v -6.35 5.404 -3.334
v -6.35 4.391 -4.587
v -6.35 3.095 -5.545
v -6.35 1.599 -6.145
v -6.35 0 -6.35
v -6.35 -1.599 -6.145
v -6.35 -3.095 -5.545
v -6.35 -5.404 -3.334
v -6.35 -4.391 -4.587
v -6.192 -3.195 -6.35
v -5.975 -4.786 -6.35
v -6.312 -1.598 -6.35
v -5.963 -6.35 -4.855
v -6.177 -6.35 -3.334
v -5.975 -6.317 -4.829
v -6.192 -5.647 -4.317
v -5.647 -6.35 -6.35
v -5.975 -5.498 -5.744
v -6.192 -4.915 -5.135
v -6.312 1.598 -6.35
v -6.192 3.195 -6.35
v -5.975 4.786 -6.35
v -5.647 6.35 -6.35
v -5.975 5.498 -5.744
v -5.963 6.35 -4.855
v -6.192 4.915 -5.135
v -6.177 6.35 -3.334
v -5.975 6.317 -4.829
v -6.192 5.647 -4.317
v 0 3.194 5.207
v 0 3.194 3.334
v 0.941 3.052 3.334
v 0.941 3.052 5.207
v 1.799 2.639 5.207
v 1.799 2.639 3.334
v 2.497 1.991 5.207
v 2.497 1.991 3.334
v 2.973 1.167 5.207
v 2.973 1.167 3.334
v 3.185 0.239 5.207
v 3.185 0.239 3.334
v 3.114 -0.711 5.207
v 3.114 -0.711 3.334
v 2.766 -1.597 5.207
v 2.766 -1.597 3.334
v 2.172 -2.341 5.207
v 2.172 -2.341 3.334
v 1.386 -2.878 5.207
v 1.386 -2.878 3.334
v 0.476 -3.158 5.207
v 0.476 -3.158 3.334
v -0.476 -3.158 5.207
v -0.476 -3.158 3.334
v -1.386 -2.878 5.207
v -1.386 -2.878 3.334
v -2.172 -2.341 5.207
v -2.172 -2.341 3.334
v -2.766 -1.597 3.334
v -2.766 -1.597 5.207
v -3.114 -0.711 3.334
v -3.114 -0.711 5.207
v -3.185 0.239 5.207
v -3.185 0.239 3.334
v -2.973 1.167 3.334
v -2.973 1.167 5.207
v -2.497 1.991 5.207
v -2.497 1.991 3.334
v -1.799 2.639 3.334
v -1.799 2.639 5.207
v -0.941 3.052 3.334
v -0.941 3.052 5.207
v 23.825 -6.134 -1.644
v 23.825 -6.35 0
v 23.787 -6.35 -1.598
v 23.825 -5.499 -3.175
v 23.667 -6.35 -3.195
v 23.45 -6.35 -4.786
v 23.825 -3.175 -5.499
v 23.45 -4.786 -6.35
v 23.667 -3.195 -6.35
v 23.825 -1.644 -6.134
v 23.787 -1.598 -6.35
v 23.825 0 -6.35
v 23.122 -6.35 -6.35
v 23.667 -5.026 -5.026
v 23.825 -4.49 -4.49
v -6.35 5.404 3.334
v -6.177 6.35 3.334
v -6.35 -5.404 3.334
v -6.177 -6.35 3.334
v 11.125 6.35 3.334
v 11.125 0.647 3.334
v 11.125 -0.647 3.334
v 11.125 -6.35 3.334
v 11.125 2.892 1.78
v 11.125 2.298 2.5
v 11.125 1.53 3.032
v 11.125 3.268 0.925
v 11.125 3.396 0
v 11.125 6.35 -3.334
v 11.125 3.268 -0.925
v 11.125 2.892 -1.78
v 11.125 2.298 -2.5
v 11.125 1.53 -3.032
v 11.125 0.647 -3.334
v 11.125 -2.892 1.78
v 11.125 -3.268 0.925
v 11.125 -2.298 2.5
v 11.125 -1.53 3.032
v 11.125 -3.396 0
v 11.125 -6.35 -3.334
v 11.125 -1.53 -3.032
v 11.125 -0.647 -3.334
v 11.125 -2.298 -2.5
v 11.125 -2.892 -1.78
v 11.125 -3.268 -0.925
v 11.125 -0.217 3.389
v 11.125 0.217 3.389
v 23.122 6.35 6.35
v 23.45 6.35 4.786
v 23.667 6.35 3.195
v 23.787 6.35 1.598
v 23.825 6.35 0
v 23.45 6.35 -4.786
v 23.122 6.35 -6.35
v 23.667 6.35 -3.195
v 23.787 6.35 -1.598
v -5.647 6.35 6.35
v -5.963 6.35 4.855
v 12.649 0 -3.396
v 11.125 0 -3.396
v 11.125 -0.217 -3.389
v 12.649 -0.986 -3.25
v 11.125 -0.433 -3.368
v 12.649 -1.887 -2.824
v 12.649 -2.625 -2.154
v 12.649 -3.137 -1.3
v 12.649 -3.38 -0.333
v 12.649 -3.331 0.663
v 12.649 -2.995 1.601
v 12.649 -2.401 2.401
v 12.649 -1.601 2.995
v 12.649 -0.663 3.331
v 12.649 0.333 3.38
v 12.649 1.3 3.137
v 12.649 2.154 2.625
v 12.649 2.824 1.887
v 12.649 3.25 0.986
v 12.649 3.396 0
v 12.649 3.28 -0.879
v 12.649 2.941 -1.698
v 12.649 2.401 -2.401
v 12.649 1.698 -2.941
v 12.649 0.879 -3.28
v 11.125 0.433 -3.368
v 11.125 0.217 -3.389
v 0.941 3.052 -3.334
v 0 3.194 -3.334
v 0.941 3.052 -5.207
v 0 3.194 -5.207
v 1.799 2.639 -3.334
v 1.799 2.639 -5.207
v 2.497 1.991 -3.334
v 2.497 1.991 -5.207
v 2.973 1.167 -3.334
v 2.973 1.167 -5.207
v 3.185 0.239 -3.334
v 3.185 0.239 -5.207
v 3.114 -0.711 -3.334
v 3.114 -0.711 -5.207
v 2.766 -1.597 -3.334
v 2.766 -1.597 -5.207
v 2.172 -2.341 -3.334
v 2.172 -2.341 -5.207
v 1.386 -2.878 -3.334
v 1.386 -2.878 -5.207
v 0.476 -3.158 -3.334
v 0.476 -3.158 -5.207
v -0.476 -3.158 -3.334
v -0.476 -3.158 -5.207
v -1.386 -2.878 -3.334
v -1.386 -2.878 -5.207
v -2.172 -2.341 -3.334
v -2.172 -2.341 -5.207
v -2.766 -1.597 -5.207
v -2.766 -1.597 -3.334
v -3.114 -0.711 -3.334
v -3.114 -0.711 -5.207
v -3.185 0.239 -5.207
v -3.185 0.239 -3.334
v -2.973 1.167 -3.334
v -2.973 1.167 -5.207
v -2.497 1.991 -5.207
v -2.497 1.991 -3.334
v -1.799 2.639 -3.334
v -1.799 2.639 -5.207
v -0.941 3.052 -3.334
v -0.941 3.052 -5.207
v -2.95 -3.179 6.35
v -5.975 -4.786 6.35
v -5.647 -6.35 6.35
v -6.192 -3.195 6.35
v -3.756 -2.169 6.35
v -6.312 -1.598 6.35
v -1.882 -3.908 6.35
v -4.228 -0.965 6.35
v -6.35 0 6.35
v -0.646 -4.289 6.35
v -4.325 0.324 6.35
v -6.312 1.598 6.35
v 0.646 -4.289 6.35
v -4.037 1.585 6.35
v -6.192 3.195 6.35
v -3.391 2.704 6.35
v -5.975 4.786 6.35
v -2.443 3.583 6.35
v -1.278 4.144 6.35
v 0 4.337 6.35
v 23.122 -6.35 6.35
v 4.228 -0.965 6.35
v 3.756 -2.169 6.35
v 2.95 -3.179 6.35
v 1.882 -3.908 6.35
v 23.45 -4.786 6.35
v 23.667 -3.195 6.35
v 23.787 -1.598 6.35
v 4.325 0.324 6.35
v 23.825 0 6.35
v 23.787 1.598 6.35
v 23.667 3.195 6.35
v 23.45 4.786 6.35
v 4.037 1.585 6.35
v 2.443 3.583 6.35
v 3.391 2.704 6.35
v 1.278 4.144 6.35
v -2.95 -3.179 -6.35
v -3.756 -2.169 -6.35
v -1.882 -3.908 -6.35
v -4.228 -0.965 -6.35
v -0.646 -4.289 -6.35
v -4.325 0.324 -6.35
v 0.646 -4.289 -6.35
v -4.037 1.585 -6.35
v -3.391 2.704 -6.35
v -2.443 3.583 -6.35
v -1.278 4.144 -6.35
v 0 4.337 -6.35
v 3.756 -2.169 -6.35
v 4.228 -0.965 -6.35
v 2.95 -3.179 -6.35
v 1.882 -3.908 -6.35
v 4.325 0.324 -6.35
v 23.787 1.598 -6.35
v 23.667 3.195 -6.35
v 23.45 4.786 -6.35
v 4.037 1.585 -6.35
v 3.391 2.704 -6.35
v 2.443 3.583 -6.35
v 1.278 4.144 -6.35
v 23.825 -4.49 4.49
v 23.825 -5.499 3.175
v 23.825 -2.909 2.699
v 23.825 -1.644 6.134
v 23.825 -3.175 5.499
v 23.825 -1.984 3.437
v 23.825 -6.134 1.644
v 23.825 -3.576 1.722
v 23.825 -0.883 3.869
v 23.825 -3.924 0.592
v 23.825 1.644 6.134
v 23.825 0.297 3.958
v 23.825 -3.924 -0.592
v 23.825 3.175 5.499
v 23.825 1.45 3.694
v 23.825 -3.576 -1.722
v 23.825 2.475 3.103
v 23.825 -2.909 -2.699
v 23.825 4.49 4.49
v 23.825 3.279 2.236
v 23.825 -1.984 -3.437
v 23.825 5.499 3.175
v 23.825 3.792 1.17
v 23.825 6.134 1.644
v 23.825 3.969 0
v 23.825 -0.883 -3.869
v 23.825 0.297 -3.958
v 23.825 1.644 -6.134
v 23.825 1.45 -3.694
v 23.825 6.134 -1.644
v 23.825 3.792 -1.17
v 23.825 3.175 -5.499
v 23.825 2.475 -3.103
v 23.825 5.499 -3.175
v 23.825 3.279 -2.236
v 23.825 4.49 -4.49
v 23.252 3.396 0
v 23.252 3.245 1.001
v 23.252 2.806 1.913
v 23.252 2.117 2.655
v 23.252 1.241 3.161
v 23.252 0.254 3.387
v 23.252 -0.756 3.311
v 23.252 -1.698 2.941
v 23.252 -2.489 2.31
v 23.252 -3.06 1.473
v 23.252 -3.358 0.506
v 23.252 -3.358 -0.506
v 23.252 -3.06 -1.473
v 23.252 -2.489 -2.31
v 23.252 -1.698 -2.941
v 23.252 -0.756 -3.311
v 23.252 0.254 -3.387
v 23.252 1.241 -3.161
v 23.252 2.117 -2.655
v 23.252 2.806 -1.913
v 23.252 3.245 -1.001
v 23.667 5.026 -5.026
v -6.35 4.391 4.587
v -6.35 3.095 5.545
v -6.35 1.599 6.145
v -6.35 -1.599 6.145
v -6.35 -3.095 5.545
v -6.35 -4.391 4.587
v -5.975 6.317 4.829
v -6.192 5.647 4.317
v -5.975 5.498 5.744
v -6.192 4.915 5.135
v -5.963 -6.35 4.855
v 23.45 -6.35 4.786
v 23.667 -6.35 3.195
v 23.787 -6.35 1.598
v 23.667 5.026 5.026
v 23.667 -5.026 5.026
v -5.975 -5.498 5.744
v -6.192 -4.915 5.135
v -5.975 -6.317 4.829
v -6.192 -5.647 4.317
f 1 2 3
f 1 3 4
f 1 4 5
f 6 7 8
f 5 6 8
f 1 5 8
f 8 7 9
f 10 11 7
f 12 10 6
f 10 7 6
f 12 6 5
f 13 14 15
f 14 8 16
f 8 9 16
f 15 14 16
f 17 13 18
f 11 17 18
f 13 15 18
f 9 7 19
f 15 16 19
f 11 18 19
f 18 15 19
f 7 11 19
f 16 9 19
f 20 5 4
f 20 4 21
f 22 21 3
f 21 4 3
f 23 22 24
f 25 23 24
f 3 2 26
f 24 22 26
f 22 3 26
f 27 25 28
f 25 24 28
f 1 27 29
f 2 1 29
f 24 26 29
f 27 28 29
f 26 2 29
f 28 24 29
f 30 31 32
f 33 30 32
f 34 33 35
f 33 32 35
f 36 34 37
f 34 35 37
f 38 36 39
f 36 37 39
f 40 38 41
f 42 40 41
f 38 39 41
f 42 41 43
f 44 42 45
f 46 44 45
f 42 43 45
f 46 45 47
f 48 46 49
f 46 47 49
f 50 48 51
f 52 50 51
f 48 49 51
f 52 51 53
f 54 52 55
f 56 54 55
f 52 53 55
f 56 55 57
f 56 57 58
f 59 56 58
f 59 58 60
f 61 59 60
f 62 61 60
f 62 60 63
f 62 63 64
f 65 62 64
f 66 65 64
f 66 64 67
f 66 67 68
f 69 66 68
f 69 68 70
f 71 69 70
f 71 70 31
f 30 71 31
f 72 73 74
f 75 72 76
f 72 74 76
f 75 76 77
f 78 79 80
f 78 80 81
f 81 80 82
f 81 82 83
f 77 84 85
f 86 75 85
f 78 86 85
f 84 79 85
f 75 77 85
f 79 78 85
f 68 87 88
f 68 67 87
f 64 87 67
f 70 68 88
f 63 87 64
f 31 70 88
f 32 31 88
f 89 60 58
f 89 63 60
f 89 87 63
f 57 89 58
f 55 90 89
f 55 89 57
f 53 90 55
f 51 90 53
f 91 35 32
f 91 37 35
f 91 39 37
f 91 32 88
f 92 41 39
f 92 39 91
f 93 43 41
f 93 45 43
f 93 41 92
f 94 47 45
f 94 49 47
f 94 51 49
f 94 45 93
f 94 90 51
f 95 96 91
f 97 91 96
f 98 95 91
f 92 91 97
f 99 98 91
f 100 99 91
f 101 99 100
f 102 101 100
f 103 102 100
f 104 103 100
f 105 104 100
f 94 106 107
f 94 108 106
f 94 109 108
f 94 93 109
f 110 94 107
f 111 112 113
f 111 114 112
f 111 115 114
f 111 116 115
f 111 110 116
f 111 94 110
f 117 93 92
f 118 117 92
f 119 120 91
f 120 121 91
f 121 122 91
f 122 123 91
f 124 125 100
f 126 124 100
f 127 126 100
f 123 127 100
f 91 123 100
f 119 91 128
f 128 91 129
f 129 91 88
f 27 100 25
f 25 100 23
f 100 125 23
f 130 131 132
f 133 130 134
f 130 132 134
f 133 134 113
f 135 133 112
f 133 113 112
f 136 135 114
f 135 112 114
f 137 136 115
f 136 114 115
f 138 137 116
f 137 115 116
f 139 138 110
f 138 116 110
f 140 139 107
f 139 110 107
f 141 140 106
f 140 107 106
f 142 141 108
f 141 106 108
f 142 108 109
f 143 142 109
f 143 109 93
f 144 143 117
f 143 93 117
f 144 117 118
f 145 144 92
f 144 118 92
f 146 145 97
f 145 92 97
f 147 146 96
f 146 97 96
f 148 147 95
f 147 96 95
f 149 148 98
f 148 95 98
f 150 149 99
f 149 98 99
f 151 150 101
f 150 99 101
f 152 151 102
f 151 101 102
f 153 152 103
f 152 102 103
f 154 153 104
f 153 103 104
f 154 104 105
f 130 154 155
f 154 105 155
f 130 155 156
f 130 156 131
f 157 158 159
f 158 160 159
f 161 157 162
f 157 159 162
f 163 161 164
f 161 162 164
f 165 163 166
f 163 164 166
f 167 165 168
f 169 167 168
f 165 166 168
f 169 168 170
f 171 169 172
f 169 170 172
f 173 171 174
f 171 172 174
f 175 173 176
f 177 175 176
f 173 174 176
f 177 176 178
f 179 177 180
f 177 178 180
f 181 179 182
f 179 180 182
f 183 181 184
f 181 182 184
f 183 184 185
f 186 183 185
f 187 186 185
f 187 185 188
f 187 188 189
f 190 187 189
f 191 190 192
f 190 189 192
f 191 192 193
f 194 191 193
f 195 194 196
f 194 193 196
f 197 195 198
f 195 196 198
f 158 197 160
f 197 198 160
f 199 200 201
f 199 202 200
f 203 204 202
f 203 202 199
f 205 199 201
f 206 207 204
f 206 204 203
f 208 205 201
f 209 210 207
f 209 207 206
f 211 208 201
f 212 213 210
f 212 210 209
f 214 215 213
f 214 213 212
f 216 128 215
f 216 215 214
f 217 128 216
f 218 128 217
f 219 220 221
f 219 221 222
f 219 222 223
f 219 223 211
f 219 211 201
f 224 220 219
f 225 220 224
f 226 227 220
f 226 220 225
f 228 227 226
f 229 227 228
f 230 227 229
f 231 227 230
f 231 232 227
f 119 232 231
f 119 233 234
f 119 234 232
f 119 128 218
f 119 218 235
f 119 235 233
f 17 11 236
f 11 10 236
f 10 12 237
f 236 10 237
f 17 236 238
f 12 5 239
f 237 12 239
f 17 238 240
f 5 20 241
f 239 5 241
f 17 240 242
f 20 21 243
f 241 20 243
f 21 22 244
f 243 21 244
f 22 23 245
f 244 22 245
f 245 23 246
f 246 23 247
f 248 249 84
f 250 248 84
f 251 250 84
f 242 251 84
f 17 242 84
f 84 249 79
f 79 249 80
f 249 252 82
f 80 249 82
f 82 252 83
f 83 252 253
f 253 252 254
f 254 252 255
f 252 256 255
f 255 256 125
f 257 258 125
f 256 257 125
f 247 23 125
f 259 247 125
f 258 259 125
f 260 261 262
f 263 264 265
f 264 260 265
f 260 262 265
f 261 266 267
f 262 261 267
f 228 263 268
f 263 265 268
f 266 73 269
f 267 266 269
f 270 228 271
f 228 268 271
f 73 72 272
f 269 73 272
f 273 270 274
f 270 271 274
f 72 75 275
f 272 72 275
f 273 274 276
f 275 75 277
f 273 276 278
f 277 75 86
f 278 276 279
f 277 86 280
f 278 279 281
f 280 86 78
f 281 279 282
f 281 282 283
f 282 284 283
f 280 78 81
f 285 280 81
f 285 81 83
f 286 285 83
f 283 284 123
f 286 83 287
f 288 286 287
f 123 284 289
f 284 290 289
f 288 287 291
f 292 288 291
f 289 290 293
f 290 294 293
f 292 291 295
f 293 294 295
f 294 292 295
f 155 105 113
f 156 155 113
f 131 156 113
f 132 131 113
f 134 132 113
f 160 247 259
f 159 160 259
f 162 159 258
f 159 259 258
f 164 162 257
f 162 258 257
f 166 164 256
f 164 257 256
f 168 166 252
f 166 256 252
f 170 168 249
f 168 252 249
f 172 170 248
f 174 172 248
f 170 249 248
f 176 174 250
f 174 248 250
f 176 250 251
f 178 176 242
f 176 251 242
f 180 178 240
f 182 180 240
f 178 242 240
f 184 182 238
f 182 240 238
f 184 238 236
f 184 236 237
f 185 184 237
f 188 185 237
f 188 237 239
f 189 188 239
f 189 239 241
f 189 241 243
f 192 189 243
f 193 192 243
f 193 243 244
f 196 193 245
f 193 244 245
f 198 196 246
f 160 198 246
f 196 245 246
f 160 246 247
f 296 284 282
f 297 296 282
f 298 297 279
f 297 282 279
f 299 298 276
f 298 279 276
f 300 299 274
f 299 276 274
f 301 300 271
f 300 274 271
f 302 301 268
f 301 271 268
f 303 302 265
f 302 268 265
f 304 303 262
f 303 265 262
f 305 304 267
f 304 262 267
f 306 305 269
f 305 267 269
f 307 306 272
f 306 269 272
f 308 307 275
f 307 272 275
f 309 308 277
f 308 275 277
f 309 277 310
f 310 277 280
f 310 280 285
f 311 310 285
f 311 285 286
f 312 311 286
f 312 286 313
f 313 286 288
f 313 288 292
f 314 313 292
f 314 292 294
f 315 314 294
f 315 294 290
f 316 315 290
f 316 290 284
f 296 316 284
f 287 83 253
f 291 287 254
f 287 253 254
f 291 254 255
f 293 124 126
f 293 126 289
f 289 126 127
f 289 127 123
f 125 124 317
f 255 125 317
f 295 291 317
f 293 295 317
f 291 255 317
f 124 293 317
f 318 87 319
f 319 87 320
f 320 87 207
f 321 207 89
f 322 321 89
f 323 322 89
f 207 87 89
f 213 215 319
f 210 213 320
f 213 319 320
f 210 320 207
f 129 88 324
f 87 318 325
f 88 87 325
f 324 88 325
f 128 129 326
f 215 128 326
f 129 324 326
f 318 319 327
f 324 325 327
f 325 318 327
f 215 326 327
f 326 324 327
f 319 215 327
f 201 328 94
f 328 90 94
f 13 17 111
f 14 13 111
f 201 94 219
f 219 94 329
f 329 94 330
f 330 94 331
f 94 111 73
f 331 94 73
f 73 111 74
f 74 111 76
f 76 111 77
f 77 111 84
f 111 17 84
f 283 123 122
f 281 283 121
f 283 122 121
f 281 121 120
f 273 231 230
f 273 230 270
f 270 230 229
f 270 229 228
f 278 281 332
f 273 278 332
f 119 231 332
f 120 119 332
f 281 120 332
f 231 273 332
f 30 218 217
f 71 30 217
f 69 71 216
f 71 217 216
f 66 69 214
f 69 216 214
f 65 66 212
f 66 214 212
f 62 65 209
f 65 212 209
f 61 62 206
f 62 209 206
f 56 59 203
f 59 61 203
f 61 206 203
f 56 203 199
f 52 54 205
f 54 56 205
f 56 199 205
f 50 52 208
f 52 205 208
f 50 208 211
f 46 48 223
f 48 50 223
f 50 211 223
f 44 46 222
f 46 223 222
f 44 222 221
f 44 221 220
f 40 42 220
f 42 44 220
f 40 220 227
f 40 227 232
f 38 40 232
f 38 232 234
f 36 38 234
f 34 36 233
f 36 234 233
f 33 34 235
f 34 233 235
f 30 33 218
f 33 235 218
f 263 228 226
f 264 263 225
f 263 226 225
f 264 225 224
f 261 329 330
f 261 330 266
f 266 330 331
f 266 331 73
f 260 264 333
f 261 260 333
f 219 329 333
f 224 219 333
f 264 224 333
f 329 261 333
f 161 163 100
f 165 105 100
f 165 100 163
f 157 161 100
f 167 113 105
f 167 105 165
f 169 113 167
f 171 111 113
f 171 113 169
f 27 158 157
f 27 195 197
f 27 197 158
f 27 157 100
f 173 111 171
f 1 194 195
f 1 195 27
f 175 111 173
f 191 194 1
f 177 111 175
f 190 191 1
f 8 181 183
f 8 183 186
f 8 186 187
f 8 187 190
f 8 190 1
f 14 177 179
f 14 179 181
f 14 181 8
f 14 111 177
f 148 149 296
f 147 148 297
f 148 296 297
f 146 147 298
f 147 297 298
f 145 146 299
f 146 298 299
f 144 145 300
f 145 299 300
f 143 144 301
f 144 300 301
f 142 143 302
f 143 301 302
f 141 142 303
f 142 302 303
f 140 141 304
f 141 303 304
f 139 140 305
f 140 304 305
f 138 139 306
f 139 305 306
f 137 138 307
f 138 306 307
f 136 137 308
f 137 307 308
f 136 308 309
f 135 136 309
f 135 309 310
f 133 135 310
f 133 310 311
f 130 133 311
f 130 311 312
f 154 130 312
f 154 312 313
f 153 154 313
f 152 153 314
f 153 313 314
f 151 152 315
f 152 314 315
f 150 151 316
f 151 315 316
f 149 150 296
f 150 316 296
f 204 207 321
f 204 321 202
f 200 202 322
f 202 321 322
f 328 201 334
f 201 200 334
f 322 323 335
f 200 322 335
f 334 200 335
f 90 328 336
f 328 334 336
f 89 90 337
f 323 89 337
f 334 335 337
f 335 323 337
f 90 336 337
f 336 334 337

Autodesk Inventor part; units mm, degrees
sketch "Sketch_1" plane through (0, 0, 0) normal (0, 0, 1) x (1, 0, 0)
  line L0 (-6.35, -6.35) -> (23.8252, -6.35)
  line L1 (23.8252, -6.35) -> (23.8252, 6.35)
  line L2 (23.8252, 6.35) -> (-6.35, 6.35)
  line L3 (-6.35, 6.35) -> (-6.35, -6.35)
extrude "Extrusion1" add sketch "Sketch_1" along normal mid plane 12.7
sketch "Sketch_2" plane through (0, 0, 0) normal (0, 1, 0) x (-1, 0, 0)
  line L0 (6.35, 3.3338) -> (-11.1252, 3.3338)
  line L1 (-11.1252, 3.3338) -> (-11.1252, -3.3338)
  line L2 (-11.1252, -3.3338) -> (6.35, -3.3338)
  line L3 (6.35, -3.3338) -> (6.35, 3.3338)
extrude "Extrusion2" cut sketch "Sketch_2" along normal mid plane 12.7
sketch "Sketch_3" plane through (0, 0, 0) normal (0, 0, 1) x (1, 0, 0)
  line L0 (23.8252, 0) -> (12.6492, 0)
  line L1 (12.6492, 0) -> (12.6492, 3.396)
  line L2 (12.6492, 3.396) -> (23.2524, 3.396)
  line L3 (23.2524, 3.396) -> (23.8252, 3.9688)
  line L4 (23.8252, 3.9688) -> (23.8252, 0)
  line L5 (23.8252, 0) -> (12.6492, 0)
revolve "Revolution1" cut sketch "Sketch_3" angle 360 about axis through (23.8252, 0, 0) along (1, 0, 0)
thread "Thread1" size "5/16-24 UNF" class "2B" standard "ANSI Unified Screw Threads" full length
sketch "Sketch5" plane through (12.6492, 0, 0) normal (1, 0, 0) x (0, 0, -1)
  point P0 (0, 0)
hole "Hole1" at (12.6492, 0, 0) direction (-1, 0, 0) diameter 6.792 depth 1.524
sketch "Sketch_5" plane through (0, 0, 0) normal (1, 0, 0) x (0, 1, 0)
  line L0 (0, -6.35) -> (0, 6.35)
  line L1 (0, 6.35) -> (4.3371, 6.35)
  line L2 (4.3371, 6.35) -> (3.194, 5.207)
  line L3 (3.194, 5.207) -> (3.194, -5.207)
  line L4 (3.194, -5.207) -> (4.3371, -6.35)
  line L5 (4.3371, -6.35) -> (0, -6.35)
  line L6 (0, -6.35) -> (0, 6.35)
revolve "Revolution2" cut sketch "Sketch_5" angle 360 about axis through (0, 0, -6.35) along (0, 0, -1)
sketch "Sketch_9" plane through (0, 0, 0) normal (0, 0, 1) x (1, 0, 0)
  line L0 (30.1752, 0) -> (23.8252, 0)
  line L1 (23.8252, 0) -> (23.8252, 6.35)
  arc A0 (23.8252, 6.35) -> (21.2852, 12.7) centre (6.6802, 3.175) ccw
  line L2 (21.2852, 12.7) -> (30.1752, 12.7)
  line L3 (30.1752, 12.7) -> (30.1752, 0)
  line L4 (30.1752, 0) -> (23.8252, 0)
revolve "Revolution3" cut sketch "Sketch_9" angle 360 about axis through (30.1752, 0, 0) along (1, 0, 0)
sketch "Sketch_10" plane through (0, 0, 0) normal (0, 0, 1) x (1, 0, 0)
  line L0 (-6.35, 0) -> (-12.7, 0)
  line L1 (-12.7, 0) -> (-12.7, 12.7)
  line L2 (-12.7, 12.7) -> (-3.81, 12.7)
  arc A0 (-3.81, 12.7) -> (-6.35, 6.35) centre (10.795, 3.175) ccw
  line L3 (-6.35, 6.35) -> (-6.35, 0)
  line L4 (-6.35, 0) -> (-12.7, 0)
revolve "Revolution4" cut sketch "Sketch_10" angle 360 about axis through (-6.35, 0, 0) along (1, 0, 0)
ref_plane "dummy_XY" through (0, 0, 0) normal (0, 0, 1) x (1, 0, 0)
ref_plane "dummy_YZ" through (0, 0, 0) normal (1, 0, 0) x (0, 1, 0)
ref_plane "dummy_ZX" through (0, 0, 0) normal (0, 1, 0) x (0, 0, 1)
ref_plane "h1_XY" through (-6.35, 6.35, 0) normal (0, 0, 1) x (1, 0, 0)
ref_plane "h1_YZ" through (-6.35, 6.35, 0) normal (1, 0, 0) x (0, 1, 0)
ref_plane "h1_ZX" through (-6.35, 6.35, 0) normal (0, 1, 0) x (0, 0, 1)
ref_plane "h2_XY" through (-6.35, -6.35, 0) normal (0, 0, 1) x (1, 0, 0)
ref_plane "h2_YZ" through (-6.35, -6.35, 0) normal (1, 0, 0) x (0, 1, 0)
ref_plane "h2_ZX" through (-6.35, -6.35, 0) normal (0, 1, 0) x (0, 0, 1)
ref_plane "l1_XY" through (23.8252, 6.35, 0) normal (0, 0, 1) x (1, 0, 0)
ref_plane "l1_YZ" through (23.8252, 6.35, 0) normal (1, 0, 0) x (0, 1, 0)
ref_plane "l1_ZX" through (23.8252, 6.35, 0) normal (0, 1, 0) x (0, 0, 1)
ref_plane "l11_XY" through (23.8252, 6.35, 0) normal (0, 0, 1) x (1, 0, 0)
ref_plane "l11_YZ" through (23.8252, 6.35, 0) normal (1, 0, 0) x (0, 1, 0)
ref_plane "l11_ZX" through (23.8252, 6.35, 0) normal (0, 1, 0) x (0, 0, 1)
ref_plane "l12_XY" through (0, 6.35, 0) normal (0, 0, 1) x (1, 0, 0)
ref_plane "l12_YZ" through (0, 6.35, 0) normal (1, 0, 0) x (0, 1, 0)
ref_plane "l12_ZX" through (0, 6.35, 0) normal (0, 1, 0) x (0, 0, 1)
ref_plane "l2_XY" through (-6.35, 6.35, 0) normal (0, 0, 1) x (1, 0, 0)
ref_plane "l2_YZ" through (-6.35, 6.35, 0) normal (1, 0, 0) x (0, 1, 0)
ref_plane "l2_ZX" through (-6.35, 6.35, 0) normal (0, 1, 0) x (0, 0, 1)
ref_plane "l21_XY" through (23.8252, 0, 0) normal (0, 1, 0) x (1, 0, 0)
ref_plane "l21_YZ" through (23.8252, 0, 0) normal (1, 0, 0) x (0, 0, -1)
ref_plane "l21_ZX" through (23.8252, 0, 0) normal (0, 0, -1) x (0, 1, 0)
ref_plane "l22_XY" through (11.1252, 0, 0) normal (0, 1, 0) x (1, 0, 0)
ref_plane "l22_YZ" through (11.1252, 0, 0) normal (1, 0, 0) x (0, 0, -1)
ref_plane "l22_ZX" through (11.1252, 0, 0) normal (0, 0, -1) x (0, 1, 0)
ref_plane "piston_rod_clevis_XY" through (23.8252, 0, 0) normal (1, 0, 0) x (0, 0, -1)
ref_plane "piston_rod_clevis_YZ" through (23.8252, 0, 0) normal (0, 0, -1) x (0, 1, 0)
ref_plane "piston_rod_clevis_ZX" through (23.8252, 0, 0) normal (0, 1, 0) x (1, 0, 0)
ref_plane "rod_clevis_body_XY" through (0, 0, 0) normal (0, 0, 1) x (1, 0, 0)
ref_plane "rod_clevis_body_YZ" through (0, 0, 0) normal (1, 0, 0) x (0, 1, 0)
ref_plane "rod_clevis_body_ZX" through (0, 0, 0) normal (0, 1, 0) x (0, 0, 1)
ref_plane "th1_XY" through (23.8252, 3.9688, 0) normal (0, 0, 1) x (1, 0, 0)
ref_plane "th1_YZ" through (23.8252, 3.9688, 0) normal (1, 0, 0) x (0, 1, 0)
ref_plane "th1_ZX" through (23.8252, 3.9688, 0) normal (0, 1, 0) x (0, 0, 1)
ref_plane "th2_XY" through (23.8252, -3.9688, 0) normal (0, 0, 1) x (1, 0, 0)
ref_plane "th2_YZ" through (23.8252, -3.9688, 0) normal (1, 0, 0) x (0, 1, 0)
ref_plane "th2_ZX" through (23.8252, -3.9688, 0) normal (0, 1, 0) x (0, 0, 1)
ref_plane "to_cylinder_XY" through (11.1252, 0, 0) normal (1, 0, 0) x (0, 0, -1)
ref_plane "to_cylinder_YZ" through (11.1252, 0, 0) normal (0, 0, -1) x (0, 1, 0)
ref_plane "to_cylinder_ZX" through (11.1252, 0, 0) normal (0, 1, 0) x (1, 0, 0)
ref_plane "w1_XY" through (23.8252, 0, -6.35) normal (0, 1, 0) x (1, 0, 0)
ref_plane "w1_YZ" through (23.8252, 0, -6.35) normal (1, 0, 0) x (0, 0, -1)
ref_plane "w1_ZX" through (23.8252, 0, -6.35) normal (0, 0, -1) x (0, 1, 0)
ref_plane "w11_XY" through (-6.35, 0, -3.3338) normal (0, 1, 0) x (1, 0, 0)
ref_plane "w11_YZ" through (-6.35, 0, -3.3338) normal (1, 0, 0) x (0, 0, -1)
ref_plane "w11_ZX" through (-6.35, 0, -3.3338) normal (0, 0, -1) x (0, 1, 0)
ref_plane "w12_XY" through (-6.35, 0, 3.3338) normal (0, 1, 0) x (1, 0, 0)
ref_plane "w12_YZ" through (-6.35, 0, 3.3338) normal (1, 0, 0) x (0, 0, -1)
ref_plane "w12_ZX" through (-6.35, 0, 3.3338) normal (0, 0, -1) x (0, 1, 0)
ref_plane "w2_XY" through (23.8252, 0, 6.35) normal (0, 1, 0) x (1, 0, 0)
ref_plane "w2_YZ" through (23.8252, 0, 6.35) normal (1, 0, 0) x (0, 0, -1)
ref_plane "w2_ZX" through (23.8252, 0, 6.35) normal (0, 0, -1) x (0, 1, 0)
properties part number "D-14059"
